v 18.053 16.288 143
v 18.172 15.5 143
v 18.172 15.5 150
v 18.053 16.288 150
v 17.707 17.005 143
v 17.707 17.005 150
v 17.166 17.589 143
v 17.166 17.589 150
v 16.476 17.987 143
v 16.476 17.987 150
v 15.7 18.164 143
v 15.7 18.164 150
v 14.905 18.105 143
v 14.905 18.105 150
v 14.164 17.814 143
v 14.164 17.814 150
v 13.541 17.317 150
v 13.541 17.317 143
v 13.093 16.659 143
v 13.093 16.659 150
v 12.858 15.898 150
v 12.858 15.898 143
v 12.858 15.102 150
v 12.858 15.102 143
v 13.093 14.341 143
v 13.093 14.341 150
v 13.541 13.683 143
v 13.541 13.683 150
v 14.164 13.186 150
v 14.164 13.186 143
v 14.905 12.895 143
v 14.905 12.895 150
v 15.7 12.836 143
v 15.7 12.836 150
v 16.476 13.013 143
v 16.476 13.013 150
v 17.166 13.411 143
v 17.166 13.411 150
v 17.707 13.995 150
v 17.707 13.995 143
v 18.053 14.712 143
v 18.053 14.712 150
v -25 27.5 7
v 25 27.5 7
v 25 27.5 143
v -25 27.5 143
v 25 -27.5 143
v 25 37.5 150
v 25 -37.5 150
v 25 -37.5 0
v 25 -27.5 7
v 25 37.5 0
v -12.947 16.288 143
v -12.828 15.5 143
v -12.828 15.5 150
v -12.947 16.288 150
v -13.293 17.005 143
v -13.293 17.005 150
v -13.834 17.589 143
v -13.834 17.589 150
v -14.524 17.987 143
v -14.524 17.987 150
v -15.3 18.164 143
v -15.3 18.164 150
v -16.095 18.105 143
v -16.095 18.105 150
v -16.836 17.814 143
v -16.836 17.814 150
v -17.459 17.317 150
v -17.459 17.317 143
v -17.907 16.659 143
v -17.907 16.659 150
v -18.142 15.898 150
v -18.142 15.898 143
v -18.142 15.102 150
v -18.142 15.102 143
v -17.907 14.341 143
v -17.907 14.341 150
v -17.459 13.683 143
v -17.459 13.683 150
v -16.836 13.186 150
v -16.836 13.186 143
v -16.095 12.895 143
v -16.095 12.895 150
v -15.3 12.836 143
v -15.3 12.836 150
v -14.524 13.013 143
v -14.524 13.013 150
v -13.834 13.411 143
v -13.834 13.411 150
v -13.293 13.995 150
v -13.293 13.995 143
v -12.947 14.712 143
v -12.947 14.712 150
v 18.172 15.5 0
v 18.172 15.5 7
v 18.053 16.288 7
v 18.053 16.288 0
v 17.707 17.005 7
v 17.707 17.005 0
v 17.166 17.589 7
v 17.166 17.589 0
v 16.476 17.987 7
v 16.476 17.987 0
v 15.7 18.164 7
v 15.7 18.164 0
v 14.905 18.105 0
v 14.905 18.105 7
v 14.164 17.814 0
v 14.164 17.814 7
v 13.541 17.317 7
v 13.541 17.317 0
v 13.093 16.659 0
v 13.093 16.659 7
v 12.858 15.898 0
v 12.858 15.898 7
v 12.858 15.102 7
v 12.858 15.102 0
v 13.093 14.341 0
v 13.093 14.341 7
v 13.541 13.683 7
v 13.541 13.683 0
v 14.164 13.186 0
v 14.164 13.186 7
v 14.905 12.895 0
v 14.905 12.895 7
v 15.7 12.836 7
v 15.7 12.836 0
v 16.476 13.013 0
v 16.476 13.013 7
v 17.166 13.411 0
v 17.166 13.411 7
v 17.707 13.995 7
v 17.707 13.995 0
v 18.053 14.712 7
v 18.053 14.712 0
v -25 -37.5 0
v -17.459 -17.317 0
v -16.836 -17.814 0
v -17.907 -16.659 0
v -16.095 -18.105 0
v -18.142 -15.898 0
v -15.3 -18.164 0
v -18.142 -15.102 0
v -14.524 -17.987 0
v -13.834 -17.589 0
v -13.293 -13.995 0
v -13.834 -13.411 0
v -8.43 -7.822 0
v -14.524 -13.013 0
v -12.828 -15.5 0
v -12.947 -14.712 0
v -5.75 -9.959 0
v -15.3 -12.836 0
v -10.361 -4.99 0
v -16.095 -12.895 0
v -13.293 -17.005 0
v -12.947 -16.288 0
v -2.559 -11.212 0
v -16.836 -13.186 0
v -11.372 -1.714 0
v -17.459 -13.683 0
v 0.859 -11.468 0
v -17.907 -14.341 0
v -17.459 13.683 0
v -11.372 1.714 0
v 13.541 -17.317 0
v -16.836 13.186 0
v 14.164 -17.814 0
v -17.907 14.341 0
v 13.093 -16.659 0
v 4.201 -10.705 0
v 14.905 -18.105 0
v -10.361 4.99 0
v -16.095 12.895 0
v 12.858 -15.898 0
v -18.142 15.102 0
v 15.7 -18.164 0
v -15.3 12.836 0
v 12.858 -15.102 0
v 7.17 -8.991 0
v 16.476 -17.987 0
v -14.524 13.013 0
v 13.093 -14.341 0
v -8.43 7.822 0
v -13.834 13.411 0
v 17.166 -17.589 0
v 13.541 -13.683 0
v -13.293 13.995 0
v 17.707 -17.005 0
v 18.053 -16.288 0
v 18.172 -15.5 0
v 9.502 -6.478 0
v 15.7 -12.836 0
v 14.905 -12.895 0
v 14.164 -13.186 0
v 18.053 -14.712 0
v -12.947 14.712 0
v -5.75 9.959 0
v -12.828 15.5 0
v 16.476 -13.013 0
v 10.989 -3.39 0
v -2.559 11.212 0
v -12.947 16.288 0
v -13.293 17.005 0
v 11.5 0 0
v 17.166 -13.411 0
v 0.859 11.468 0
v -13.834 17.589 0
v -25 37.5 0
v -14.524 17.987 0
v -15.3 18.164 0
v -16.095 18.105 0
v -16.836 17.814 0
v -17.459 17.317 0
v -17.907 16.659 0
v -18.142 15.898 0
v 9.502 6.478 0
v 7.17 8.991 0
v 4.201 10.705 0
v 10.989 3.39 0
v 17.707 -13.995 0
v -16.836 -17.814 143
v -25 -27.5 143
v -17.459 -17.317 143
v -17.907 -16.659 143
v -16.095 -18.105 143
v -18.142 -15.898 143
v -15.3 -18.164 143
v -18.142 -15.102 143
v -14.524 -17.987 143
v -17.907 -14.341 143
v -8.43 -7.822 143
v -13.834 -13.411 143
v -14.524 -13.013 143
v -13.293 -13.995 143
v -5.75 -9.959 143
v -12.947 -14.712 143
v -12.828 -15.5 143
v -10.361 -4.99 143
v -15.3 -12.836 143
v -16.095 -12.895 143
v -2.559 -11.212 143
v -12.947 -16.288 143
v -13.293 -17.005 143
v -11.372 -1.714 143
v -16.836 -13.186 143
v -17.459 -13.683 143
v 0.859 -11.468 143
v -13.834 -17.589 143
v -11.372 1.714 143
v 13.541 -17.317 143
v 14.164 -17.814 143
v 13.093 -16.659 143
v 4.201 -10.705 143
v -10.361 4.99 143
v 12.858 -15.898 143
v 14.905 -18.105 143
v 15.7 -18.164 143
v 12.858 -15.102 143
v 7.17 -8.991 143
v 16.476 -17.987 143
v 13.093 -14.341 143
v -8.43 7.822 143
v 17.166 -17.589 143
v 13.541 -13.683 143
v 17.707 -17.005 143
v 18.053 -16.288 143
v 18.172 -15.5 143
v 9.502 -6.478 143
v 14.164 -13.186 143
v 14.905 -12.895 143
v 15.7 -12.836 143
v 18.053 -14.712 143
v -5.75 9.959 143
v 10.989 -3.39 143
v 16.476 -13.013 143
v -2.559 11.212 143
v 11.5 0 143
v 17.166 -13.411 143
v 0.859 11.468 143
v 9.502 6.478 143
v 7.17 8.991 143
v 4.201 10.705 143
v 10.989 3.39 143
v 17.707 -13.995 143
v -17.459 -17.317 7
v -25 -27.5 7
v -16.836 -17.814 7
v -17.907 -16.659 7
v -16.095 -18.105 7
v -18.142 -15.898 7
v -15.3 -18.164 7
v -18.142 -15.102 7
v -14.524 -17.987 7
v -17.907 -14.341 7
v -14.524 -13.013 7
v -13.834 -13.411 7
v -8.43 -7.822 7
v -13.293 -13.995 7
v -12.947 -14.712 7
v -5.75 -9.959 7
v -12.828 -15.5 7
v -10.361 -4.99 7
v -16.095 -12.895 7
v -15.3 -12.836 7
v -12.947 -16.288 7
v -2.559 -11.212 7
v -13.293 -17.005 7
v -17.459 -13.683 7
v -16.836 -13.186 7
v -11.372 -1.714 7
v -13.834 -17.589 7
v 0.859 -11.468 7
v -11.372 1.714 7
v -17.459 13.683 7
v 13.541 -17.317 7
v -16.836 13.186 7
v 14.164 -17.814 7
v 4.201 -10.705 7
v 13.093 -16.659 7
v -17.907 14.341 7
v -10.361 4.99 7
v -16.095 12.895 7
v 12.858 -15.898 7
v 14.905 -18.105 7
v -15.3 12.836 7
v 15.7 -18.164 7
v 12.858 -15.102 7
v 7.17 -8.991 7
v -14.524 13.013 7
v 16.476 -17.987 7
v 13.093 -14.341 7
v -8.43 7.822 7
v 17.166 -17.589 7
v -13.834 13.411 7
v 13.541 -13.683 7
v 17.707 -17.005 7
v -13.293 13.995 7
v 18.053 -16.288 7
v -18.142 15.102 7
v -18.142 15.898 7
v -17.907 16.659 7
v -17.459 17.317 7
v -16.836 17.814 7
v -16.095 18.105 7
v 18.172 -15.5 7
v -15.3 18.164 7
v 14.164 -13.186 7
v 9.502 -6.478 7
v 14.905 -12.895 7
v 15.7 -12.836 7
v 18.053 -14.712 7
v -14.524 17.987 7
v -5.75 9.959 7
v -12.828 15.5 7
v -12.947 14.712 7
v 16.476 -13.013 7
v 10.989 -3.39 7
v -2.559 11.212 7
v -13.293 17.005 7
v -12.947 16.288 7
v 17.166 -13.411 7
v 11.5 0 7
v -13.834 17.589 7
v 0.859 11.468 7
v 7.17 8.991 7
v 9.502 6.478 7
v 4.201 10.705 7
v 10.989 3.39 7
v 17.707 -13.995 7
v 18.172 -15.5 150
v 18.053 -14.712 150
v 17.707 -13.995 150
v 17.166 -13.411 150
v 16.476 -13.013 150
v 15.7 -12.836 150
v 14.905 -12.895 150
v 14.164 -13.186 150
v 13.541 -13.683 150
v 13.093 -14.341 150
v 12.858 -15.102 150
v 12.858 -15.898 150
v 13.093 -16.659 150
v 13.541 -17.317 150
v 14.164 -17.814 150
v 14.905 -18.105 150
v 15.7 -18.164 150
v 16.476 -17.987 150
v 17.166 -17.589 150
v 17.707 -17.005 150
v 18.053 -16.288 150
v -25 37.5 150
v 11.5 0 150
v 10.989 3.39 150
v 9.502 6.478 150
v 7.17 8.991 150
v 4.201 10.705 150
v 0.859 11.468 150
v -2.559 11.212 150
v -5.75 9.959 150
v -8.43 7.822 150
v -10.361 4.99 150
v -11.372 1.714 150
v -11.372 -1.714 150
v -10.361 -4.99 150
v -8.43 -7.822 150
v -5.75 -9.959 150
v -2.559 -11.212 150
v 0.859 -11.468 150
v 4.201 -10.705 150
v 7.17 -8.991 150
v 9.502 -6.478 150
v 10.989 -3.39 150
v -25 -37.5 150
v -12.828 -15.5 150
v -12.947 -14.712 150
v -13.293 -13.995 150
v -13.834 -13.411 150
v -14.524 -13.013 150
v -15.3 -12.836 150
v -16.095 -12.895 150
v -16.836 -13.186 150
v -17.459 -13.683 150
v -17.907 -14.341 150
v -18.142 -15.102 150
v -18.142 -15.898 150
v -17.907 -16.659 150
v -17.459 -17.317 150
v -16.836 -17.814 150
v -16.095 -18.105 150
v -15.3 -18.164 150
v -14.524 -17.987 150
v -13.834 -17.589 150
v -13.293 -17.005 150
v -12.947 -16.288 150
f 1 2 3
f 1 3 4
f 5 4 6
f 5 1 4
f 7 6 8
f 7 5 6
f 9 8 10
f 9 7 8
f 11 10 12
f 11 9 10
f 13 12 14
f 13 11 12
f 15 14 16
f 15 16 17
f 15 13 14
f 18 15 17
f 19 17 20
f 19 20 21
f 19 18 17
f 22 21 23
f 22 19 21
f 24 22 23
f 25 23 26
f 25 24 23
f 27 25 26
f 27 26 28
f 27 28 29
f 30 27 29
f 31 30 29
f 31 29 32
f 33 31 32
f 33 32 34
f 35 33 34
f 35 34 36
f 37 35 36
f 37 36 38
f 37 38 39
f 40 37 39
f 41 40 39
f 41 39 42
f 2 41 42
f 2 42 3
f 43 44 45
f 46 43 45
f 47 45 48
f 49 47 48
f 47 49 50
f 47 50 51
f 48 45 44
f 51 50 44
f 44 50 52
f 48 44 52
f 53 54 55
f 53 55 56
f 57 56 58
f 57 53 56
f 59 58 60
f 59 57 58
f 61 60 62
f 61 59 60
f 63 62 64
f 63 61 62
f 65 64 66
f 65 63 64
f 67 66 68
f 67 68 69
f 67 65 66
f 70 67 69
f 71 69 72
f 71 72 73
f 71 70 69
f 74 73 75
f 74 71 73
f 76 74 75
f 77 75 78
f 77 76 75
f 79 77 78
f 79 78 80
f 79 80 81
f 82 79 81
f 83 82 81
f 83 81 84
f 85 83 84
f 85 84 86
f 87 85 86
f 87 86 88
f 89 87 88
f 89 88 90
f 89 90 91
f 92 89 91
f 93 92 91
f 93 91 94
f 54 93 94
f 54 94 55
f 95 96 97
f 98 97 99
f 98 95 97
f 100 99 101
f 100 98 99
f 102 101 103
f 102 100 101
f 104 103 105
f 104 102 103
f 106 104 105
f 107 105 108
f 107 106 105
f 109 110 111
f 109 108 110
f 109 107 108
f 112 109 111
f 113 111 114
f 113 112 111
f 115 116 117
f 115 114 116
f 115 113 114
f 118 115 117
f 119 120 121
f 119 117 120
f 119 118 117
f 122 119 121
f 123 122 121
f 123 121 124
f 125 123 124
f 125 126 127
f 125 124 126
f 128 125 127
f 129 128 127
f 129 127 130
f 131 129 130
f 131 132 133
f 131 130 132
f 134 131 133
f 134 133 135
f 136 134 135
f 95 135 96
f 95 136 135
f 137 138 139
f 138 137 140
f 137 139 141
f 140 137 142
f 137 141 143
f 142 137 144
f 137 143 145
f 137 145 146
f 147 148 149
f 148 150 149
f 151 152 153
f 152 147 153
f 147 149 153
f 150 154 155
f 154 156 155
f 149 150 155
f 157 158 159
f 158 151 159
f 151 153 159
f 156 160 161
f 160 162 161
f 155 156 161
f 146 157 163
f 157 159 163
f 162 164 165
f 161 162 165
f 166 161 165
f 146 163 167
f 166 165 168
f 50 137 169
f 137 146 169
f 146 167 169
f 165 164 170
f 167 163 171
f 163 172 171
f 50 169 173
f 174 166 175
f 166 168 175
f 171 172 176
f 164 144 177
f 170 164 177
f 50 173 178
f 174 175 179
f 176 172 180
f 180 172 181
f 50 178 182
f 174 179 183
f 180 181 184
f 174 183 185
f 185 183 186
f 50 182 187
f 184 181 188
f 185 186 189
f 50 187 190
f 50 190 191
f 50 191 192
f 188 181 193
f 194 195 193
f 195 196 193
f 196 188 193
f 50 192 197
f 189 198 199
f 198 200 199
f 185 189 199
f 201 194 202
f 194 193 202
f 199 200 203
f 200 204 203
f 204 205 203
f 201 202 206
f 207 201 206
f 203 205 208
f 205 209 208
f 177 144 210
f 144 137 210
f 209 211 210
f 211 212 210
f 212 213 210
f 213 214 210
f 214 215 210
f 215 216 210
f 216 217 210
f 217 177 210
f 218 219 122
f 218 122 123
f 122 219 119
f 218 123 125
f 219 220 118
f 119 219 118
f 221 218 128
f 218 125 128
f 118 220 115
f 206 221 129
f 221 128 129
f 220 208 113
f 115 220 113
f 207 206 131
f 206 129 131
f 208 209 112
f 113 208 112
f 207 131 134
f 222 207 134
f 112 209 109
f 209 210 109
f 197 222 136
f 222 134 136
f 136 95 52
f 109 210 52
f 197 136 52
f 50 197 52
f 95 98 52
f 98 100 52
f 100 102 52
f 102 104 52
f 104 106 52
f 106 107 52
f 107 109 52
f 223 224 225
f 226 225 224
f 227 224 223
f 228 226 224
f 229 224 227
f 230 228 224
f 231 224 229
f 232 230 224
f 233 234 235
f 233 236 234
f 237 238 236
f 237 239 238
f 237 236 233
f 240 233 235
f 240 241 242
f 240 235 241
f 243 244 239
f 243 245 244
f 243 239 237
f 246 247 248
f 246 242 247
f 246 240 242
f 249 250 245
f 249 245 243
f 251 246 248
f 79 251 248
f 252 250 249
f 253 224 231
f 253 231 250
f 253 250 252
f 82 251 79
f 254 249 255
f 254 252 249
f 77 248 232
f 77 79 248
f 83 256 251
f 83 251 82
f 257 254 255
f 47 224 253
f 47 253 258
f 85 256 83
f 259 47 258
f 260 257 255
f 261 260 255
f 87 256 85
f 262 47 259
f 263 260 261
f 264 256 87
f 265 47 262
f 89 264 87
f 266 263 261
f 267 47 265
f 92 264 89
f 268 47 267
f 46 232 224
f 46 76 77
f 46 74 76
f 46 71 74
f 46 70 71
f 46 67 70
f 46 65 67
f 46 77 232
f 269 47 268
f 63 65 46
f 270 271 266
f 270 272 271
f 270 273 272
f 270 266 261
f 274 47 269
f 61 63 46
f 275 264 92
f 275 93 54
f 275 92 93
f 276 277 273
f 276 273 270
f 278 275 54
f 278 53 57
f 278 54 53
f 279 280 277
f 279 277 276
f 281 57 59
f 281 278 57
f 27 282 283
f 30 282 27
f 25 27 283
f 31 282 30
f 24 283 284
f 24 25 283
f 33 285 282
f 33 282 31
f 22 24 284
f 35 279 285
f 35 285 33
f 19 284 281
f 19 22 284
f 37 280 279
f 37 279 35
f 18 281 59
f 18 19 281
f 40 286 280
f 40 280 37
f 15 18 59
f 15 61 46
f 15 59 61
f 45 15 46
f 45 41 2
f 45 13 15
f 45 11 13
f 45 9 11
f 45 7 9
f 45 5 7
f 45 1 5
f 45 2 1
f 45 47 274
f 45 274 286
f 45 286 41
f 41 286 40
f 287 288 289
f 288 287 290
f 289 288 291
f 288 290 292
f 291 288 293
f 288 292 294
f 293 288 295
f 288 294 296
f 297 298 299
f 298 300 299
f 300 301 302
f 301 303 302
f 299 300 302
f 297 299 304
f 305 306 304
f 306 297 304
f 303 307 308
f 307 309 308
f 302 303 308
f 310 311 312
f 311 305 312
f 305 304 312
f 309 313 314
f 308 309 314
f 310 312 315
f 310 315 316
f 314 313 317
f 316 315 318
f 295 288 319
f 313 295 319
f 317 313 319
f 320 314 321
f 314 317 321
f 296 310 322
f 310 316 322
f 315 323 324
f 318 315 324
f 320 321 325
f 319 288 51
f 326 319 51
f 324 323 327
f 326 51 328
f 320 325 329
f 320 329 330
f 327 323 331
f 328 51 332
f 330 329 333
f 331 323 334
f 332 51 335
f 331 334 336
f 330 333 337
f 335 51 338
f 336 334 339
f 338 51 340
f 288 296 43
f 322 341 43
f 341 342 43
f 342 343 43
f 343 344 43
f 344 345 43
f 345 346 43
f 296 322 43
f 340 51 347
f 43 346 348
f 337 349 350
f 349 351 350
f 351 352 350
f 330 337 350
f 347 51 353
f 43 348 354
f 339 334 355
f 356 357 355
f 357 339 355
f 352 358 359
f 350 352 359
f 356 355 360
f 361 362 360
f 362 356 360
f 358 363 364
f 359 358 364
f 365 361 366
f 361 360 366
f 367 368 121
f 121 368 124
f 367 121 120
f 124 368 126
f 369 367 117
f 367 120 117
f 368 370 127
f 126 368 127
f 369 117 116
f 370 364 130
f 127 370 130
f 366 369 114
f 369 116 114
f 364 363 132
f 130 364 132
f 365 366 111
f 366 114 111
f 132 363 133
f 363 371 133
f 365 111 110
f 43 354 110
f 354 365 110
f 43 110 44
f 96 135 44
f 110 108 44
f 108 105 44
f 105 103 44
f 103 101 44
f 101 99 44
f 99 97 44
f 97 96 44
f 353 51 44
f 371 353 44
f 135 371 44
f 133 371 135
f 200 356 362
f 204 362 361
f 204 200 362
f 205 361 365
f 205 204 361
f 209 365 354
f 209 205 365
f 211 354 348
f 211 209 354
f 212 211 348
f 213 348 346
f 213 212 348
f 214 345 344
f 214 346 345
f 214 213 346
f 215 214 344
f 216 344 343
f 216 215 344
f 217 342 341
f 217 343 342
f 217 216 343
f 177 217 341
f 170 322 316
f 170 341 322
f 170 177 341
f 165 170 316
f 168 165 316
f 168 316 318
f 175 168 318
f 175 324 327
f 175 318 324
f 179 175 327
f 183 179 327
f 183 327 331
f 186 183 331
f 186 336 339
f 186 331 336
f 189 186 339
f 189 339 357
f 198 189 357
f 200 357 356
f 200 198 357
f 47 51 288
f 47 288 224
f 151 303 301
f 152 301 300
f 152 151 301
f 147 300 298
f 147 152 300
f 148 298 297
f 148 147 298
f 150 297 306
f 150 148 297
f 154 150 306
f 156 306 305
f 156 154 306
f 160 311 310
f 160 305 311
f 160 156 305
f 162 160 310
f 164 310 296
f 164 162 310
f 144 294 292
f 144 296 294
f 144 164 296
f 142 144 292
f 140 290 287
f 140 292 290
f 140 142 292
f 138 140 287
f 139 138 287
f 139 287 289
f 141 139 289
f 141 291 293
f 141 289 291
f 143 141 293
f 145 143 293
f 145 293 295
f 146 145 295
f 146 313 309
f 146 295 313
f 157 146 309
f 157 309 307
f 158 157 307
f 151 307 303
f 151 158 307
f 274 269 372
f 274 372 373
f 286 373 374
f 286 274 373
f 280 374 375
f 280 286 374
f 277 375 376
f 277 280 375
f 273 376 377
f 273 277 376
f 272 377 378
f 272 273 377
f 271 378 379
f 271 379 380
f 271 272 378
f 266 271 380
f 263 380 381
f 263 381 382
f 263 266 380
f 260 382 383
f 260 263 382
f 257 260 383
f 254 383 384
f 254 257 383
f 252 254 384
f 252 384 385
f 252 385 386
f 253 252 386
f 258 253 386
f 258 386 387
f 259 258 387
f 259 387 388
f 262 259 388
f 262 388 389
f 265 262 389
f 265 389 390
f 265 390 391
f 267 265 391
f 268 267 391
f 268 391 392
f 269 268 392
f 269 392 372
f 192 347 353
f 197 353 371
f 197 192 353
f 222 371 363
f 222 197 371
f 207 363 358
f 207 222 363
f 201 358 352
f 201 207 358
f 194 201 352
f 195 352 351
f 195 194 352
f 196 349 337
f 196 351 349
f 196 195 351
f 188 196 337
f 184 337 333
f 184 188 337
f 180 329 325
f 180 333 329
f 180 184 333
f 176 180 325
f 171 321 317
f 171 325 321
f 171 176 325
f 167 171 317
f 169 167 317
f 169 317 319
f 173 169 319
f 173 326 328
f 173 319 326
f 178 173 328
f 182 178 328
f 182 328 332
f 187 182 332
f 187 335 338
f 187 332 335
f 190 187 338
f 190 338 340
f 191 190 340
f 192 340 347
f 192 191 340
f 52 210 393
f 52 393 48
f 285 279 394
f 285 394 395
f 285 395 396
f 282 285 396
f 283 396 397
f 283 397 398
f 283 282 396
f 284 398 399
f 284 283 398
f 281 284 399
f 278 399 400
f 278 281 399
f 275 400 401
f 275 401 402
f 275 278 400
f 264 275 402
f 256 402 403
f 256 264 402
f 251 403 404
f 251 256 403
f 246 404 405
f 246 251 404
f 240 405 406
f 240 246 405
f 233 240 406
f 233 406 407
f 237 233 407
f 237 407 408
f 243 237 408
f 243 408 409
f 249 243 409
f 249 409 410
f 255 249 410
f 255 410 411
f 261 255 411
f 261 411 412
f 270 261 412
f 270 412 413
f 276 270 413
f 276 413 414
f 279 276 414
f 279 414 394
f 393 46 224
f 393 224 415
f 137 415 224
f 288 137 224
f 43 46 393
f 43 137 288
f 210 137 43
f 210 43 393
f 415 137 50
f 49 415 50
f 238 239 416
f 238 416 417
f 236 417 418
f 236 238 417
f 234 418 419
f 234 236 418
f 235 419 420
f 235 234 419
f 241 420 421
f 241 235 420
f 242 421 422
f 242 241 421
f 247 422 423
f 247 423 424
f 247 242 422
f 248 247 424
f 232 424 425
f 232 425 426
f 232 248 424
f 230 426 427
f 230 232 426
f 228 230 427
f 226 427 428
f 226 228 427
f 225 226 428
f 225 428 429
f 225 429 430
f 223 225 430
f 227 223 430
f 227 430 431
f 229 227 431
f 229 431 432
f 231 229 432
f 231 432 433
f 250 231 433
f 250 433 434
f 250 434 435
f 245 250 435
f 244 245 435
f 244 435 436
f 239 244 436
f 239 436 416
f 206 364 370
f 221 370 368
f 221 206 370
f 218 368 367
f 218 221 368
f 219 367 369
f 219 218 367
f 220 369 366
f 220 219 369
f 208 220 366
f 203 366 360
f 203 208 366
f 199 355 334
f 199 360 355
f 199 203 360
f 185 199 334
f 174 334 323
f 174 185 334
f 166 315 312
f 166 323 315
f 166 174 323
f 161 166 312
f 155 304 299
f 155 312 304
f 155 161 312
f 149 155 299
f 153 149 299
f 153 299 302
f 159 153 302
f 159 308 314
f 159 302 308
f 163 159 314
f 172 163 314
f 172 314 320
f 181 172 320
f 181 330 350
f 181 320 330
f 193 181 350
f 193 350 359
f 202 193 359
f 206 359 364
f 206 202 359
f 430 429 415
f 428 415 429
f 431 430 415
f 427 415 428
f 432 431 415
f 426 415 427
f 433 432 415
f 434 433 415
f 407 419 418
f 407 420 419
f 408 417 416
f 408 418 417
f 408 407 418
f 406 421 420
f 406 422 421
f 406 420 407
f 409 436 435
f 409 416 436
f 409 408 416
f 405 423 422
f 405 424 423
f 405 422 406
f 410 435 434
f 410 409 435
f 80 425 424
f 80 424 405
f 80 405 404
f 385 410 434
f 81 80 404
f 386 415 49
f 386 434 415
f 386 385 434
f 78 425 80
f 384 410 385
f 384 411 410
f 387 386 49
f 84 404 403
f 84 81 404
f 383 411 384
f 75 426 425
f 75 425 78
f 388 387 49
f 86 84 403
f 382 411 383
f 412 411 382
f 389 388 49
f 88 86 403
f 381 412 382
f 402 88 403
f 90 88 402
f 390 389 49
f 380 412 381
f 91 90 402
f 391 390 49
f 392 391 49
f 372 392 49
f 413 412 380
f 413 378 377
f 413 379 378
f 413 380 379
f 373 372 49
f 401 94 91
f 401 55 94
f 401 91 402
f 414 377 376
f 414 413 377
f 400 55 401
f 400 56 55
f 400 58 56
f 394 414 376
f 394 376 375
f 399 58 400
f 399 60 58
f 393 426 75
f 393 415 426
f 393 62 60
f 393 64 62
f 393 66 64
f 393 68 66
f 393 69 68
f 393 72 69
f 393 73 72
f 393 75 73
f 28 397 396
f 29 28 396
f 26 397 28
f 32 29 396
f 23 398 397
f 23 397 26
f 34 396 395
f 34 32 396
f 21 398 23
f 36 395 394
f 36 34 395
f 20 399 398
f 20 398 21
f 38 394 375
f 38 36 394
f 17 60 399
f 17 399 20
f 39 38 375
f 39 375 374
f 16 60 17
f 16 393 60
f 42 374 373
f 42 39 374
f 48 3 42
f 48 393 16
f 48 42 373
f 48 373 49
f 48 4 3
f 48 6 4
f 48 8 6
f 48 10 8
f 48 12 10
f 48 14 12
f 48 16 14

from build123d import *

# Parameters (mm, degrees)
F0_W          = 50
F0_H          = 75
F0_R          = 2.6717182094
F0_R_2        = 11.5
F1_DEPTH      = 150
F2_W          = 55
F2_H          = 136
F3_DEPTH      = 50
F3_DEPTH_BACK = 50


with BuildPart() as f1:
    # F0 (on Top) → F1 (new body)
    with BuildSketch(Plane.XY):
        Rectangle(F0_W, F0_H)
        with Locations((-15.5, -15.5)):
            Circle(F0_R, mode=Mode.SUBTRACT)
        with Locations((15.5, -15.5)):
            Circle(F0_R, mode=Mode.SUBTRACT)
        with Locations((-15.5, 15.5)):
            Circle(F0_R, mode=Mode.SUBTRACT)
        Circle(F0_R_2, mode=Mode.SUBTRACT)
        with Locations((15.5, 15.5)):
            Circle(F0_R, mode=Mode.SUBTRACT)
    extrude(amount=F1_DEPTH)

    # F2 (on Right) → F3 (cut, two sides)
    with BuildSketch(Plane.YZ) as f3_sk:
        with Locations((0, 75)):
            Rectangle(F2_W, F2_H)
    extrude(amount=-F3_DEPTH, mode=Mode.SUBTRACT)
    extrude(f3_sk.sketch, amount=F3_DEPTH_BACK, mode=Mode.SUBTRACT)


solid = f1.part
